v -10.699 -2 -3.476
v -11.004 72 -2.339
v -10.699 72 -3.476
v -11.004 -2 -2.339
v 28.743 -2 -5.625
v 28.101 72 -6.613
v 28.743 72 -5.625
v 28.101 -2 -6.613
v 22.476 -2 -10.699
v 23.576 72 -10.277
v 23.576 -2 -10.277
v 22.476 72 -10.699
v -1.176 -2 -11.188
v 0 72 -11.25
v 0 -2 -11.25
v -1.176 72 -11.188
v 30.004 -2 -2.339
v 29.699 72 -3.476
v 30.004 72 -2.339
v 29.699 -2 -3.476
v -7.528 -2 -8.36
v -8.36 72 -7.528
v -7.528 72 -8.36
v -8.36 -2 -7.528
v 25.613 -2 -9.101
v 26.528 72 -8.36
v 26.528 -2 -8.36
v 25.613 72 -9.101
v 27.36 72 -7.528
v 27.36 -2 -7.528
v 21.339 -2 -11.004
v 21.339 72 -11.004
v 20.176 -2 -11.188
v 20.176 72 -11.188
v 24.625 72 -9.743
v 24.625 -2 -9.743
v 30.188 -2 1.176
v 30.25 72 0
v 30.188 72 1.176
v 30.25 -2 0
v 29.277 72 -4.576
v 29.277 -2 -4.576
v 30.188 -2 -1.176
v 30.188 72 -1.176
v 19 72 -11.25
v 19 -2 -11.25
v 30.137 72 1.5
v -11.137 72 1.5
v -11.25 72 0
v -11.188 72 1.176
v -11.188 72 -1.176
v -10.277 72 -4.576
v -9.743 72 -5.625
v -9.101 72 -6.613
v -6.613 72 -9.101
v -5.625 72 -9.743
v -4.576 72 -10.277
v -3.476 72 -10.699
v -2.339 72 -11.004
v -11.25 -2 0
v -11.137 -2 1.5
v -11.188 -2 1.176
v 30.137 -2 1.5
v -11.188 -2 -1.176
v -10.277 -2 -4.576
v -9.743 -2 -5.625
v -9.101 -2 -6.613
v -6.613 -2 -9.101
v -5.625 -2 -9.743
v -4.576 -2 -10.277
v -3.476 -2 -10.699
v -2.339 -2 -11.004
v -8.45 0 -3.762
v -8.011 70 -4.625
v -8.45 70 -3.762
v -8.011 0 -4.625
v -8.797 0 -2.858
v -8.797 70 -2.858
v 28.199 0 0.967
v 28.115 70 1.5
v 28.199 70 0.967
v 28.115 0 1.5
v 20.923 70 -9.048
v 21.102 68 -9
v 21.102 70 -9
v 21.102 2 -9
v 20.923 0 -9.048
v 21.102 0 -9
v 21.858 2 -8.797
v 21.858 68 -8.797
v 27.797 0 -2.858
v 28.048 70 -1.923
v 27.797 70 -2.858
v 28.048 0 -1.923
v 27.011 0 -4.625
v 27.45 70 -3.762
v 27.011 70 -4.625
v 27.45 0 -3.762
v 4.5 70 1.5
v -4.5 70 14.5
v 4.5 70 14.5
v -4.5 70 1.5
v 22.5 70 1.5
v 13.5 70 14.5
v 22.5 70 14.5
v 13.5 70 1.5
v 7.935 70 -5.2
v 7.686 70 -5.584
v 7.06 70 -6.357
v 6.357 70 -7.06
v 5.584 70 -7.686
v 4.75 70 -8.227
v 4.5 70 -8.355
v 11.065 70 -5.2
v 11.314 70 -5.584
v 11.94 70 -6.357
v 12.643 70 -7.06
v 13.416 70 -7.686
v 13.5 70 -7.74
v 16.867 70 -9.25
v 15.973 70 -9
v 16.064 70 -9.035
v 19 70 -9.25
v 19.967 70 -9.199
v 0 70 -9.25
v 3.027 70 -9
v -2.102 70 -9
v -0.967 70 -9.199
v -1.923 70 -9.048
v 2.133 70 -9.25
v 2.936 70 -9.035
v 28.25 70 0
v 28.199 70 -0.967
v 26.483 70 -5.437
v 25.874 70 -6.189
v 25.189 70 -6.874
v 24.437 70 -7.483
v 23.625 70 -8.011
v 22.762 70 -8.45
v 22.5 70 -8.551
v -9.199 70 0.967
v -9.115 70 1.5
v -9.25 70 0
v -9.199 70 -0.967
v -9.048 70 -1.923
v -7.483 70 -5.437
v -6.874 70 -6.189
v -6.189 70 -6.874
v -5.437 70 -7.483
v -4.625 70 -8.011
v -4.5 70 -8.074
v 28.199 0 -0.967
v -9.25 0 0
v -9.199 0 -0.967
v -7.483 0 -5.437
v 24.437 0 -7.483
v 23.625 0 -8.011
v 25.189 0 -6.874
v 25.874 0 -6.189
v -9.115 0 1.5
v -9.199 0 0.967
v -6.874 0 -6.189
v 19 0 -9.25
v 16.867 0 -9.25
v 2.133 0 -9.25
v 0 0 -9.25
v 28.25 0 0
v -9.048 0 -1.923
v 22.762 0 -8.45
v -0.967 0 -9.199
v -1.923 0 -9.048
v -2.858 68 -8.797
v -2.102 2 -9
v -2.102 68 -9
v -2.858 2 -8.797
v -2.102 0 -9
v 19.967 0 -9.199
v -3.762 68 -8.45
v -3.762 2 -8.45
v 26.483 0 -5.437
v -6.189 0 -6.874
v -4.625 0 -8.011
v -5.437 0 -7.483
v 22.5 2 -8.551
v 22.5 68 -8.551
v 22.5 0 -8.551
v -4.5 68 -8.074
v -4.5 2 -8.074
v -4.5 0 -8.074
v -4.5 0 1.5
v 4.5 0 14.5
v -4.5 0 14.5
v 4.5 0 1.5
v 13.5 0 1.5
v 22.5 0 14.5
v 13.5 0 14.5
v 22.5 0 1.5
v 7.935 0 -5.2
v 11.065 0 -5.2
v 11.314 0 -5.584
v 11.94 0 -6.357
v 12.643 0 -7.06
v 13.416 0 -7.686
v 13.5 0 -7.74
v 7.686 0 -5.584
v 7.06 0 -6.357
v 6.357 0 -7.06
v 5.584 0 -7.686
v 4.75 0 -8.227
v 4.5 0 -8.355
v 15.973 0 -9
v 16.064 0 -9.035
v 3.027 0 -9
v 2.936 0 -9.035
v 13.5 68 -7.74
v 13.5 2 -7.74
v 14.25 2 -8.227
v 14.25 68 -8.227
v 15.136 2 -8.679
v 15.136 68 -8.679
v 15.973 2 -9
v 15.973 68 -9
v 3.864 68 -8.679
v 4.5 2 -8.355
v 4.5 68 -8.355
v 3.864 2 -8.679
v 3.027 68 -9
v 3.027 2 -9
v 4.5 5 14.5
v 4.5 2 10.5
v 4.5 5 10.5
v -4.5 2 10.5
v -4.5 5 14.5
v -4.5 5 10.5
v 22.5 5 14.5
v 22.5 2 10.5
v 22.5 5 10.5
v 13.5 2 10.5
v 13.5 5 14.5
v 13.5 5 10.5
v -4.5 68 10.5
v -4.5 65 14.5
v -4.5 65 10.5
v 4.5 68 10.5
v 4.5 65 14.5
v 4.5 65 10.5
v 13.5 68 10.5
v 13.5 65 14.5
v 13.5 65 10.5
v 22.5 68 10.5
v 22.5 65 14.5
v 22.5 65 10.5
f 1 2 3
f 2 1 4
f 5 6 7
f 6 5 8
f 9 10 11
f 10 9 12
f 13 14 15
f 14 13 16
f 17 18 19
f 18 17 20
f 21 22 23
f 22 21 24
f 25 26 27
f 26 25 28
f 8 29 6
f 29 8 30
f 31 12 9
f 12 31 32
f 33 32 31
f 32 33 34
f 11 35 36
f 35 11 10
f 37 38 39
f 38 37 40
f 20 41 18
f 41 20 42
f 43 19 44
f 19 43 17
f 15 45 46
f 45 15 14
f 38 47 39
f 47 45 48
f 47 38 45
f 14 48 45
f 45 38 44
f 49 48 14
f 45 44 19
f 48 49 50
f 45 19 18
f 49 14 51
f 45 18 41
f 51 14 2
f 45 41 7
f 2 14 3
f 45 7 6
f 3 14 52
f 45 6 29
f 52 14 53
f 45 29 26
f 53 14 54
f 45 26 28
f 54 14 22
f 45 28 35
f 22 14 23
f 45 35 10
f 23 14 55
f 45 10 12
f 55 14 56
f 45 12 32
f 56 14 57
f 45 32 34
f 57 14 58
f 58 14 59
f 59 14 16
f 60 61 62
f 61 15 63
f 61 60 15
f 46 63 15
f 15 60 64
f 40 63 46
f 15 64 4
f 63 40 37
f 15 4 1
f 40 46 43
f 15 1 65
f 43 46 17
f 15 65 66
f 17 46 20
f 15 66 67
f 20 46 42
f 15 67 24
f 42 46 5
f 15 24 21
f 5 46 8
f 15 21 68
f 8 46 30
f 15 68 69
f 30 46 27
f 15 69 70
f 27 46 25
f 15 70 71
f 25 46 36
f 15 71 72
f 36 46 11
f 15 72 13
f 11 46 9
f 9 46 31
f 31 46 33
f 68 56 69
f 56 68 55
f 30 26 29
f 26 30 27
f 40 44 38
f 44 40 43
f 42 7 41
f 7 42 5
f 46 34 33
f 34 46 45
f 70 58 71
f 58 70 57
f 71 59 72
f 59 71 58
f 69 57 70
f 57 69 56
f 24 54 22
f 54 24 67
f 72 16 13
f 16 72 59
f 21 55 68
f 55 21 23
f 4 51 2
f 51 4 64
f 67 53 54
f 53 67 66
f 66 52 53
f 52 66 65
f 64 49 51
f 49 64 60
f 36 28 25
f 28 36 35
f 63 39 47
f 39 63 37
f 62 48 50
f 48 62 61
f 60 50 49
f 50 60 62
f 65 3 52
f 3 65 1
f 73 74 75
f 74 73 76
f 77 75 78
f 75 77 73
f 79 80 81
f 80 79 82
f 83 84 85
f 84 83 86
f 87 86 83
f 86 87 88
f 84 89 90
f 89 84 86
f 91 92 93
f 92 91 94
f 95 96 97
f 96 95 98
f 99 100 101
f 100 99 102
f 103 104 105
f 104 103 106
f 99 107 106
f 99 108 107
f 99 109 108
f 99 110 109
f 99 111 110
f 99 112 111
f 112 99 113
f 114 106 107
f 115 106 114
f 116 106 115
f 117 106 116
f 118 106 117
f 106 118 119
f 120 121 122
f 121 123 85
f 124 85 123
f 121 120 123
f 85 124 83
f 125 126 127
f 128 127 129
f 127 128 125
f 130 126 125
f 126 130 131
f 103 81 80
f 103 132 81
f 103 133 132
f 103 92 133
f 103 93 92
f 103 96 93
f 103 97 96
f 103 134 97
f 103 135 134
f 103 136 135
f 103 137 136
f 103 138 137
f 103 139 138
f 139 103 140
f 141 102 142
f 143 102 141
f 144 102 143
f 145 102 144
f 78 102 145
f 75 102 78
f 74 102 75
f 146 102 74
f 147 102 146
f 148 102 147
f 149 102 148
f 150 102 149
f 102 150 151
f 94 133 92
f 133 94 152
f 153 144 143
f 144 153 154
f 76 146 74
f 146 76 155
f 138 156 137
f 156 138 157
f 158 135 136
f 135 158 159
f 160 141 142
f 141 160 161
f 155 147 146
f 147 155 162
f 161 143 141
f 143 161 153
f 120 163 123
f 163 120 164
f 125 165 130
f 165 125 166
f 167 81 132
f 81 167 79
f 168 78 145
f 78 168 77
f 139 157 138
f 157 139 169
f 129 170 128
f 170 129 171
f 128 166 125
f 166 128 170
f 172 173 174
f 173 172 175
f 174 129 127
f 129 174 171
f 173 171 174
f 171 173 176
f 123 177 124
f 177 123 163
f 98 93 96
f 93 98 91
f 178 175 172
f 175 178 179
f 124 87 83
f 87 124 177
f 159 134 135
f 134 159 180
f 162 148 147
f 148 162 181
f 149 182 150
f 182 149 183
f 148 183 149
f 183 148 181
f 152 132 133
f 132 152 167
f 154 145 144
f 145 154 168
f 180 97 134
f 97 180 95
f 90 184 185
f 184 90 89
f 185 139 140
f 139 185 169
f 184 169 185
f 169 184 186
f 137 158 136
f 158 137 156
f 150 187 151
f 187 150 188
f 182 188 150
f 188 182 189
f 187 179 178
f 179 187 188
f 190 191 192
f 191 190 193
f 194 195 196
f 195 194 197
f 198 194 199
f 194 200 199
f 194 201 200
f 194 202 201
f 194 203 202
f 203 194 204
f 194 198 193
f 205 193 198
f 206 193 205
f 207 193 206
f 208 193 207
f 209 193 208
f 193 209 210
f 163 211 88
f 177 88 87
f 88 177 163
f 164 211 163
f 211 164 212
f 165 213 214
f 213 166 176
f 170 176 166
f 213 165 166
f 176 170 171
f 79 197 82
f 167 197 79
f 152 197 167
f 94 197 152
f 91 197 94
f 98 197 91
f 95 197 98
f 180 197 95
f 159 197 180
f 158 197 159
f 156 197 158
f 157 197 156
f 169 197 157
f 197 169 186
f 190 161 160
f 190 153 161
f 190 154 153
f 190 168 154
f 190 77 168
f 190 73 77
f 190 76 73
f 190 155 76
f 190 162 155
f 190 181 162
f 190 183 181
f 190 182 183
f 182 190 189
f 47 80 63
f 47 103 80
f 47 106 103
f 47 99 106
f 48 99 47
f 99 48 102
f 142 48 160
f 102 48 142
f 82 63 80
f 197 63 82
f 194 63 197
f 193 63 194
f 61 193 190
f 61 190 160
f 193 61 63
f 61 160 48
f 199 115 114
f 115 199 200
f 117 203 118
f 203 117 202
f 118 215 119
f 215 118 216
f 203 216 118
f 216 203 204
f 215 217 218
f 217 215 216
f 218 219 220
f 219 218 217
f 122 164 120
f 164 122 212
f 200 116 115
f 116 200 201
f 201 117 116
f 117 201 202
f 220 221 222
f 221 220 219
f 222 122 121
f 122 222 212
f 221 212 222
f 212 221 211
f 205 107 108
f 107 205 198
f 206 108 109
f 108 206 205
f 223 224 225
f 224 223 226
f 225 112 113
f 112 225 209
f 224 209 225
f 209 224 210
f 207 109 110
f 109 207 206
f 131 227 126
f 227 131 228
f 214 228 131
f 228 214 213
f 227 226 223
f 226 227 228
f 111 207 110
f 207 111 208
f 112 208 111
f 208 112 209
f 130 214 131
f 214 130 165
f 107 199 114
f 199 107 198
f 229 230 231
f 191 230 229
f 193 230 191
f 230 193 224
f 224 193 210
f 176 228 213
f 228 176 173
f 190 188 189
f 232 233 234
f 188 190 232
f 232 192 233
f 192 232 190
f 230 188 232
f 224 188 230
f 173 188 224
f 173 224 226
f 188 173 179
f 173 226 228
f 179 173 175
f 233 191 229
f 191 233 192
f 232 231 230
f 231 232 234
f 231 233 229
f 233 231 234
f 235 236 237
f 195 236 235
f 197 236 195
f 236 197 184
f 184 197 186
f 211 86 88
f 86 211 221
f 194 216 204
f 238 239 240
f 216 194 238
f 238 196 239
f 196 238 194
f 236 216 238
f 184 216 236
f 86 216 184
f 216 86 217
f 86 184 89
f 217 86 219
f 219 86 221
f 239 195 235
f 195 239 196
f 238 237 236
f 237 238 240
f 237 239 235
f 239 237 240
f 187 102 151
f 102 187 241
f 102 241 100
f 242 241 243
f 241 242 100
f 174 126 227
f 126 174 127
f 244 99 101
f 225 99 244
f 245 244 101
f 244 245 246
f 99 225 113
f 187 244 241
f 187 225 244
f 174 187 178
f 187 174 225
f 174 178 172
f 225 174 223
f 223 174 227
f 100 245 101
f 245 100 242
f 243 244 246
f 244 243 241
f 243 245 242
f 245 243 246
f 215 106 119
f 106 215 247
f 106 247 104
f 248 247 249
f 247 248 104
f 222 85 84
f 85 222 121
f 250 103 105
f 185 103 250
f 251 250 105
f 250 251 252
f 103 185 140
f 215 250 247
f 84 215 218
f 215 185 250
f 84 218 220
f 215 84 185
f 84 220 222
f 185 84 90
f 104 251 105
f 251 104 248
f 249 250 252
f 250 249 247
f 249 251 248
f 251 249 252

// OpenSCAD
$fn=60;


color([0.3,0.8,0.3])
translate([0,2.5,0])
*dual();

bottom();

*top();
*button();

module _18650(y=0, d=0)
{
	rotate(-90,[1,0,0])
	cylinder(65+y,d=18.5+d);
}

module dual(hull=0,y=0,d=0)
{
	if(hull!=0)
	{
		hull()
		{
			translate([18+1,0,0])
			_18650(y,d);
			_18650(y,d);
		}
	}if(hull==0)
	{
		translate([18+1,0,0])
		_18650(y,d);
		_18650(y,d);
	}
}

module usb_charger()
{
	height=8.6+3; width=57.5; depth=27;

	translate([0,1,-10])
	cube([depth,70,height+10]);

	translate([0,6.5,0])
	union()
	{
		color([1/3,1/3,1/3])
		{
			//usb ports
			translate([-10,13.3,0])
			cube([20,14.5,7.7]);
		
			translate([-10,38.5,0])
			cube([20,14.5,7.7]);

			h=6.2;
			translate([-10,13.3+14.5,7.7-h])
			cube([20,38.5-13.3-14.5,h]);

			//switch
			translate([7.3,0,3.4])
			rotate(90,[1,0,0])
			cylinder(10,d=4.4);

			//lcd
			translate([10,18,height])
			cube([16,28.5,10]);

			//led
			translate([7,width,7.5-2.5])
			rotate(-90,[1,0,0])
			cylinder(10,d=5);

			translate([7,width+1,7.5-2.5])
			rotate(-90,[1,0,0])
			hull()
			{
				cylinder(7,d=5);
				translate([0,15])
				cylinder(7,d=5);
			}
		}
	}
}

module bottom()
{
	union()
	{
		difference()
		{
			translate([0,-2,0])
			dual(1,9,4);
			dual(1,5,0);
			translate([-20,-20,1.5])
			cube([100,100,100]);
		}
		difference()
		{
			translate([0,0,-10])
			cube([18+1,70,4.8]);
			dual(0,5,0.5);
		}	
	}
	translate([-4.5,0,-9])
	clip();
	translate([-4.5+18,0,-9])
	clip();
	rotate(180,[0,0,1])
	{
		translate([-4.5,-70,-9])
		clip();
		translate([-4.5-18,-70,-9])
		clip();
	}
}

module clip()
{
	cube([9,2,20]);
	translate([0,0,19.5])
	cube([9,5,4]);
}

module top()
{
	difference()
	{
		translate([0,-2,0])
		dual(1,9,4);
		dual(1,5,0);
		translate([-20,-20,-100])
		cube([100,100,100]);

		translate([-2,0,0])
		cube([27,70,20]);

		//parts that need holes in here
		translate([-2,5.5,9])
		{
			translate([7,58.5,7.5-2.5])
			rotate(-90,[1,0,0])
			hull()
			{
				cylinder(7,d=5);
				translate([0,15])
				cylinder(7,d=5);
			}
			
			//button
			translate([7.3,0,3.4])
			rotate(90,[1,0,0])
			cylinder(10,d=4.4);

			translate([-10,13.3,0])
			cube([20,14.5,7.7]);
		
			translate([-10,38.5,0])
			cube([20,14.5,7.7]);
		}
	}

	translate([-2,-1,9])
	difference()
	{
		height=8.6+3+2; width=72+2; depth=27+2;
		translate([-1,-1,0.01])
		difference()
		{
			minkowski()
			{
				r=2;
				translate([r,r,r-2])
				cube([depth-2*r,width-2*r,height-2*r + 2]);
				sphere(r);
			}
			translate([3,2,-9])
			dual(1,5);
		}
		usb_charger();
	}
}

module button()
{

	translate([-2,5,9])
	translate([7.3,0,3.4])
	rotate(90,[1,0,0])
	cylinder(9,d=4.2);

	difference()
	{
		translate([-2,0,7])
		cube([15,3.5,14]);
		union()
		{
			difference()
			{
				top();
				translate([-100,-1000,0])
				cube(1000);
			}
			dual();
		}
	}
}
